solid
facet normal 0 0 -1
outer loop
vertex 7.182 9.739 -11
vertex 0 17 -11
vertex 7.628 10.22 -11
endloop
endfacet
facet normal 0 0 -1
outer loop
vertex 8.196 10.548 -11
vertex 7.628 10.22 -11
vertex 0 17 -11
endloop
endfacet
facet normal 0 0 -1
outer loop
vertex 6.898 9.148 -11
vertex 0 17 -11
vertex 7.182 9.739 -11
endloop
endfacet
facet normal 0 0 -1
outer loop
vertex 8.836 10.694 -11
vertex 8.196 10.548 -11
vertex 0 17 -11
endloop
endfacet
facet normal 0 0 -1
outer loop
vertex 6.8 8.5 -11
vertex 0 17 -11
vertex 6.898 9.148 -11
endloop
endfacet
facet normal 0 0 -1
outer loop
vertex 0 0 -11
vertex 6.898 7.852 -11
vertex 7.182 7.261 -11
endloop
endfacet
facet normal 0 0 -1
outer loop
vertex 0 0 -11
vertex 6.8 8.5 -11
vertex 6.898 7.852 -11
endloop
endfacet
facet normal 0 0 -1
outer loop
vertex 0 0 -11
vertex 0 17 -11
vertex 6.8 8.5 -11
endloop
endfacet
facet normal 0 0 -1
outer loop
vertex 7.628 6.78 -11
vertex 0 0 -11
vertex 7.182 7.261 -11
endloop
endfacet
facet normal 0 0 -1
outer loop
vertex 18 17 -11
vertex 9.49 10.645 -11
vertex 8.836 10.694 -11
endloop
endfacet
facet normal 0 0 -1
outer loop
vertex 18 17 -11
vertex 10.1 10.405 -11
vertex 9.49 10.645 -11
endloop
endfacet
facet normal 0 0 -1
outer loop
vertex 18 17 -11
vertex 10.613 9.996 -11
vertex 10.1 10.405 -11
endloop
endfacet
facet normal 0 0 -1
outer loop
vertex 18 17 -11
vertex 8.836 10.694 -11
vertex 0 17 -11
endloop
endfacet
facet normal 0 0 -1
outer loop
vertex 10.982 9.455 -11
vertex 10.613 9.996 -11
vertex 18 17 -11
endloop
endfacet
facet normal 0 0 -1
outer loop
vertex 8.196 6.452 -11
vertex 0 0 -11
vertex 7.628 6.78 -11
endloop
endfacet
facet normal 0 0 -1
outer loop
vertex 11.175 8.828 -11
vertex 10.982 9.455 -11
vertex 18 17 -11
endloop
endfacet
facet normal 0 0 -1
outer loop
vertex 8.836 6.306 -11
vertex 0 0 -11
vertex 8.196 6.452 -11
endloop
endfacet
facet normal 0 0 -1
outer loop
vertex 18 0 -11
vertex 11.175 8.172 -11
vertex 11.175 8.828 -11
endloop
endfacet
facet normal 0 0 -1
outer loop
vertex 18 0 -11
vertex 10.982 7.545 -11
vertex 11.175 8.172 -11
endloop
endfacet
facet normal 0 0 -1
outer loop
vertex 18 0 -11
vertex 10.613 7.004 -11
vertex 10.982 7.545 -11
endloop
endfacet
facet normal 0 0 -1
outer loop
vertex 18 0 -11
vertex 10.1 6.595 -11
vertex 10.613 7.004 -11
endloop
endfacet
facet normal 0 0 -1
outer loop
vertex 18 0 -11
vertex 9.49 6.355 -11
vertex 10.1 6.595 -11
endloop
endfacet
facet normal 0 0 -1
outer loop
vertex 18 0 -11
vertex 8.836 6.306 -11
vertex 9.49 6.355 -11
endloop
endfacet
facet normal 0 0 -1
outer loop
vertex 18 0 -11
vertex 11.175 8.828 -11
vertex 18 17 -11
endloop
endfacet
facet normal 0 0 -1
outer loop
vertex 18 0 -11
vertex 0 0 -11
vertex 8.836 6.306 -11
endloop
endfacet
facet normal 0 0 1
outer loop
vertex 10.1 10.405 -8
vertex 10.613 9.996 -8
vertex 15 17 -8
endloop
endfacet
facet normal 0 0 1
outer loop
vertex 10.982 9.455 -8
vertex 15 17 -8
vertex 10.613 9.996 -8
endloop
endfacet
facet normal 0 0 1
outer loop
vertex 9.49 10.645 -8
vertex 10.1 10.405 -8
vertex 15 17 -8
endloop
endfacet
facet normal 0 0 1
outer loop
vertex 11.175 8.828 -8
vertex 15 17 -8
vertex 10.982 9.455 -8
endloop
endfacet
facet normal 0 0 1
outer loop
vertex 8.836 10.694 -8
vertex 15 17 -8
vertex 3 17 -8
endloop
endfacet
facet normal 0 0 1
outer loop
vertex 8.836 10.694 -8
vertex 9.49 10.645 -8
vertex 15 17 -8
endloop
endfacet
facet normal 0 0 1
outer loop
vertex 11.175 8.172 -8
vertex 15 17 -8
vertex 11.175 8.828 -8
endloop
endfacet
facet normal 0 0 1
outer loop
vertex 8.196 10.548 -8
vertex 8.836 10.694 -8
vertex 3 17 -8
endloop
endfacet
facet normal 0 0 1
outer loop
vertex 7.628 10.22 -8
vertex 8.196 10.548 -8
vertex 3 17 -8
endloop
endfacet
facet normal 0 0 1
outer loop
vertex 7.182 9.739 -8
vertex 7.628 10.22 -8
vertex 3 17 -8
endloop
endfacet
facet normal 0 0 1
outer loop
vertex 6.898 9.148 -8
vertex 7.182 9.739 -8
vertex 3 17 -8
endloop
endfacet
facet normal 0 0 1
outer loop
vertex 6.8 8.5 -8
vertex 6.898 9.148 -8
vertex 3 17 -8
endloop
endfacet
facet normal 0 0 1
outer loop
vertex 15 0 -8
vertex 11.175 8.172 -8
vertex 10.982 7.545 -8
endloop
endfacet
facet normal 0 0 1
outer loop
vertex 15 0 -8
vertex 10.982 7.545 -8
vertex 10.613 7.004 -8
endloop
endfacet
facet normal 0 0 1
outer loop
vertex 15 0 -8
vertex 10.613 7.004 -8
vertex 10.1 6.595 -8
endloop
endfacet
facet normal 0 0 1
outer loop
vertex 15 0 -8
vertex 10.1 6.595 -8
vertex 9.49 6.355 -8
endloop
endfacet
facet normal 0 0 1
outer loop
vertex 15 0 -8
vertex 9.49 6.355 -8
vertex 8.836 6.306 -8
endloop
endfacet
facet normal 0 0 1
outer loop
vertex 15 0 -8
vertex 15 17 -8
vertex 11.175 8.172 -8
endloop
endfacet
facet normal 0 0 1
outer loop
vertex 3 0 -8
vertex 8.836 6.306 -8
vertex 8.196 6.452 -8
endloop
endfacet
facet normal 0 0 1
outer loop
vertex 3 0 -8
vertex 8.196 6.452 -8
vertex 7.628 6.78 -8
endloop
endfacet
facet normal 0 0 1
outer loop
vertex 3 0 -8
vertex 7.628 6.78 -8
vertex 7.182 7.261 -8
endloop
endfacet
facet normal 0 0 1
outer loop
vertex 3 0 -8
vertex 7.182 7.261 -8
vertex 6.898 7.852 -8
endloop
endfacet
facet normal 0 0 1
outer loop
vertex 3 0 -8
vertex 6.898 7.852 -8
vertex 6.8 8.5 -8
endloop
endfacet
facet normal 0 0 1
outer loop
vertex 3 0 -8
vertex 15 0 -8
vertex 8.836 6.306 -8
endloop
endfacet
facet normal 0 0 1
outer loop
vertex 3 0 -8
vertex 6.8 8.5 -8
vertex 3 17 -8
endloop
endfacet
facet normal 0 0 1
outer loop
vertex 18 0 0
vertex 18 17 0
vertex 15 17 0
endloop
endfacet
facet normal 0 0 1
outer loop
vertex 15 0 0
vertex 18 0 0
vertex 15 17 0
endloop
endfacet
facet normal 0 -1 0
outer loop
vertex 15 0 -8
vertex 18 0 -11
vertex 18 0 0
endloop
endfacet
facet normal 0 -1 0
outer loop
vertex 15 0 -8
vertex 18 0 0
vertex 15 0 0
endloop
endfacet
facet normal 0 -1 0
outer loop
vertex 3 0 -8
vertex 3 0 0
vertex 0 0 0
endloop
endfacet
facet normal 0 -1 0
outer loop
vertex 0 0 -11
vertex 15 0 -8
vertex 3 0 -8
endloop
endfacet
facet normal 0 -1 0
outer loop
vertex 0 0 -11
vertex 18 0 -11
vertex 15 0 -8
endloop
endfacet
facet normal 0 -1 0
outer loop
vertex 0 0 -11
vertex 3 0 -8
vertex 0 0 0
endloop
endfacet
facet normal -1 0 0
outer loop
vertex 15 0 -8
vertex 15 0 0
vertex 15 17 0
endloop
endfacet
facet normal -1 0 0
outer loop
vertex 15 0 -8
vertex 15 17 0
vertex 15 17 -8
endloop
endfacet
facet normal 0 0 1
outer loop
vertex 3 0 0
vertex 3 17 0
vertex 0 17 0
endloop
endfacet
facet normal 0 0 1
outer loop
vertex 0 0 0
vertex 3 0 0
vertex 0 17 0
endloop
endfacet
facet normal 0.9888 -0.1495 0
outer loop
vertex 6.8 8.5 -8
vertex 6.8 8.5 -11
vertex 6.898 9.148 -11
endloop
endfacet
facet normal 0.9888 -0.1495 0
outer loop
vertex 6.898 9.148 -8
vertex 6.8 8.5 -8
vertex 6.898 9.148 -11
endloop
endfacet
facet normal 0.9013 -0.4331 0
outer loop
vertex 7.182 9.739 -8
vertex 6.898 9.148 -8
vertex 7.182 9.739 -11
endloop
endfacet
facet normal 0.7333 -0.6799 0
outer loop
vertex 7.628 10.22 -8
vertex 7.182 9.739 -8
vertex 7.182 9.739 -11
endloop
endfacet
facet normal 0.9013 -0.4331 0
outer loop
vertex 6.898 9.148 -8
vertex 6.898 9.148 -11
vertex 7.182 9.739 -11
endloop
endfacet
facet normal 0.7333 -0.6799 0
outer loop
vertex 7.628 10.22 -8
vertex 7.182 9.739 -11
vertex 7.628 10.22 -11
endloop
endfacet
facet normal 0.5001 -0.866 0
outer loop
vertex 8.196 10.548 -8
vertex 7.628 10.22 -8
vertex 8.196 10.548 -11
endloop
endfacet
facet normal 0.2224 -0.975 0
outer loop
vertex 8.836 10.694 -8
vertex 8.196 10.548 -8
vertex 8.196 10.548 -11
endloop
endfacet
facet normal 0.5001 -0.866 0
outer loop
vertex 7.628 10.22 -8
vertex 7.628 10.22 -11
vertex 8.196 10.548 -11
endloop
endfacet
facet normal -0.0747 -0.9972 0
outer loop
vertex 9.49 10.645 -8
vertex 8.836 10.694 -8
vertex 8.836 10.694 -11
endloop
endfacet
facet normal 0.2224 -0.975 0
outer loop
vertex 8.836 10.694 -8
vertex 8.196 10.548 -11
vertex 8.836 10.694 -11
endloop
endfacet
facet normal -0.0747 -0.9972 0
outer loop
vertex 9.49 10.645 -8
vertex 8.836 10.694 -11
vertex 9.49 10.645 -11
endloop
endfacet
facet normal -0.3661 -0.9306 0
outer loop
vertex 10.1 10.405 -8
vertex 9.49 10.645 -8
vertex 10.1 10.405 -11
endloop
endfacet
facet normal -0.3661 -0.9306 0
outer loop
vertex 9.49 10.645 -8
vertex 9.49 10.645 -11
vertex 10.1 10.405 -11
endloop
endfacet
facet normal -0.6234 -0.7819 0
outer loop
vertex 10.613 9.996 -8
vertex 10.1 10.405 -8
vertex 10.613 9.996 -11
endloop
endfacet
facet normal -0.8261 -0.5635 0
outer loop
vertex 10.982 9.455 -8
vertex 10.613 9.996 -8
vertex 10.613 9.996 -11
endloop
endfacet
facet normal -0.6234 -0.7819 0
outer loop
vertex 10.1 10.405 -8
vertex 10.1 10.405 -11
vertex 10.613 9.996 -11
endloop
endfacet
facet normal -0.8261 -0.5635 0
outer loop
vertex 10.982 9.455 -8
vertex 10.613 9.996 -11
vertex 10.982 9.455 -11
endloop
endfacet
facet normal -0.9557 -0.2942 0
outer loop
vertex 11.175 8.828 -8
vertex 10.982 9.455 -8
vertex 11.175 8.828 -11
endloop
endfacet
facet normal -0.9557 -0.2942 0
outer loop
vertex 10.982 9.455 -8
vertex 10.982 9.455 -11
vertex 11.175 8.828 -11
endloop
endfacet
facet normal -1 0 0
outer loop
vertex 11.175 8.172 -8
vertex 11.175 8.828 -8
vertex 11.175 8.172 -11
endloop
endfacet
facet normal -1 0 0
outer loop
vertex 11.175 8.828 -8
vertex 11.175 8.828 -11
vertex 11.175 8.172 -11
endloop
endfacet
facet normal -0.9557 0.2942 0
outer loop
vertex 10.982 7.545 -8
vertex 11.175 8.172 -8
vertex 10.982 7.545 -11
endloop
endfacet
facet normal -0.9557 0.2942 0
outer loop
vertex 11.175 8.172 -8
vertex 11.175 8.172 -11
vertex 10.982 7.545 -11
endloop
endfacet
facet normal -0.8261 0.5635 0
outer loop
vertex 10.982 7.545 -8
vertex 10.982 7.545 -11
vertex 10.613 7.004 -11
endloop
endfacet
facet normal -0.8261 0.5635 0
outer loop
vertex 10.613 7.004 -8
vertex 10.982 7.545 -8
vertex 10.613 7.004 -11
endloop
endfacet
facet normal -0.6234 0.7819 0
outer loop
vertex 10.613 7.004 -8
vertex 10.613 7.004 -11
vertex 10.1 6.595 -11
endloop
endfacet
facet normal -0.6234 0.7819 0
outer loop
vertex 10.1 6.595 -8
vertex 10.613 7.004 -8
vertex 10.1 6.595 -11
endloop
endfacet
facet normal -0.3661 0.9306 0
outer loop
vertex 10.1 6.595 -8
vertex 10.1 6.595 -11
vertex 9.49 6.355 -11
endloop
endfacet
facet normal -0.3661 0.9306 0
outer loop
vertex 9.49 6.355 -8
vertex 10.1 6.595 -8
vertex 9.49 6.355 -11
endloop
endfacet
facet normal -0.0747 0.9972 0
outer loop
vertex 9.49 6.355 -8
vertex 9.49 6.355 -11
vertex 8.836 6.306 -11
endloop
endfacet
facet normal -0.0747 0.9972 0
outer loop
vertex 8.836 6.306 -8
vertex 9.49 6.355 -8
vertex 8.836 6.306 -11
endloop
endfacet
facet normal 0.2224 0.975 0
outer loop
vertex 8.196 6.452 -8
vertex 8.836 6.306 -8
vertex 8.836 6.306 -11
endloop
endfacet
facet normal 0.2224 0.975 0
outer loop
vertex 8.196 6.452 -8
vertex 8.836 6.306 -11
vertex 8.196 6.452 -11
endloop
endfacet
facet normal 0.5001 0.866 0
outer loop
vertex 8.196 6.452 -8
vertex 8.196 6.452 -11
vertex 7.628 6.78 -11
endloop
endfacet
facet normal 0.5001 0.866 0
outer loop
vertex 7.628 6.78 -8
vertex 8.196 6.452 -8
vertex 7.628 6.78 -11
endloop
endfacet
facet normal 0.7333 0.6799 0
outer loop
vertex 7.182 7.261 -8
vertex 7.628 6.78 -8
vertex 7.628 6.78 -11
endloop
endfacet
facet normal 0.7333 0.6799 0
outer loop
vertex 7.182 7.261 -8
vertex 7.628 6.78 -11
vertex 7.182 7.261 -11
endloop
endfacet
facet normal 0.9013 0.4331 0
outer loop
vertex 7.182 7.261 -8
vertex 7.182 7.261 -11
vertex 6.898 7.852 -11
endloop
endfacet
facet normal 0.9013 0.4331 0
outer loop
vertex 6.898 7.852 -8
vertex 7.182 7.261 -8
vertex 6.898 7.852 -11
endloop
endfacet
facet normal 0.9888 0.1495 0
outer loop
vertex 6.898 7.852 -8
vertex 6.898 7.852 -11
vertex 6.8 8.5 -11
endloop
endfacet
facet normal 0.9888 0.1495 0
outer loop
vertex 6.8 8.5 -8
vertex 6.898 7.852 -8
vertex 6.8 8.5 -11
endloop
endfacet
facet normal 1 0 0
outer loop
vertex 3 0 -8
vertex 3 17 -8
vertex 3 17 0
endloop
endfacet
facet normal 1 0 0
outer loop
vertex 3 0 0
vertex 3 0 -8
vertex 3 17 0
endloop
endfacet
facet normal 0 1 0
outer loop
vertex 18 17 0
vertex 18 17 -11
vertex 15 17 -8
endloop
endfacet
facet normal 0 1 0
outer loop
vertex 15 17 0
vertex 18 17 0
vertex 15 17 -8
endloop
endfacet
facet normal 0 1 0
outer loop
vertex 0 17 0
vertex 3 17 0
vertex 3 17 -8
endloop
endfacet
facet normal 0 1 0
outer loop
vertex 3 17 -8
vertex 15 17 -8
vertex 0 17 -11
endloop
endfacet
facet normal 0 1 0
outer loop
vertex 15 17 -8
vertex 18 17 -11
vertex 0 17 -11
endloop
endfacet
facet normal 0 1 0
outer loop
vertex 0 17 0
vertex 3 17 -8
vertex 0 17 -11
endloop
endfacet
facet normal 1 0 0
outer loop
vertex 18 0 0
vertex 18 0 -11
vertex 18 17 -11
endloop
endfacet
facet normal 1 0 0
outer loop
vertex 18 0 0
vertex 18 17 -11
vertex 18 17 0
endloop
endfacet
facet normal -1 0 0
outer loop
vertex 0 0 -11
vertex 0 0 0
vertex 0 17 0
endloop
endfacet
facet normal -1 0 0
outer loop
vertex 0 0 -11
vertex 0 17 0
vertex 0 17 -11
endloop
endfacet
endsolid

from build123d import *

# Parameters (mm, degrees)
BOSS_EXTRUDE1_DEPTH = 17
SKETCH2_R           = 2.2
CUT_EXTRUDE1_DEPTH  = 17


with BuildPart() as part:
    # Sketch1 → Boss-Extrude1 (new body)
    with BuildSketch(Plane(origin=(0, 0, 0), x_dir=(1, 0, 0), z_dir=(0, 1, 0))):
        Polygon((0, 0), (0, 11), (18, 11), (18, 0), (15, 0), (15, 8), (3, 8), (3, 0), align=None)
    extrude(amount=BOSS_EXTRUDE1_DEPTH)

    # Sketch2 → Cut-Extrude1 (cut)
    with BuildSketch(Plane(origin=(0, 0, -11), x_dir=(-1, 0, 0), z_dir=(0, 0, -1))):
        with Locations((-9, 8.5)):
            Circle(SKETCH2_R)
    extrude(amount=-CUT_EXTRUDE1_DEPTH, mode=Mode.SUBTRACT)


solid = part.part
